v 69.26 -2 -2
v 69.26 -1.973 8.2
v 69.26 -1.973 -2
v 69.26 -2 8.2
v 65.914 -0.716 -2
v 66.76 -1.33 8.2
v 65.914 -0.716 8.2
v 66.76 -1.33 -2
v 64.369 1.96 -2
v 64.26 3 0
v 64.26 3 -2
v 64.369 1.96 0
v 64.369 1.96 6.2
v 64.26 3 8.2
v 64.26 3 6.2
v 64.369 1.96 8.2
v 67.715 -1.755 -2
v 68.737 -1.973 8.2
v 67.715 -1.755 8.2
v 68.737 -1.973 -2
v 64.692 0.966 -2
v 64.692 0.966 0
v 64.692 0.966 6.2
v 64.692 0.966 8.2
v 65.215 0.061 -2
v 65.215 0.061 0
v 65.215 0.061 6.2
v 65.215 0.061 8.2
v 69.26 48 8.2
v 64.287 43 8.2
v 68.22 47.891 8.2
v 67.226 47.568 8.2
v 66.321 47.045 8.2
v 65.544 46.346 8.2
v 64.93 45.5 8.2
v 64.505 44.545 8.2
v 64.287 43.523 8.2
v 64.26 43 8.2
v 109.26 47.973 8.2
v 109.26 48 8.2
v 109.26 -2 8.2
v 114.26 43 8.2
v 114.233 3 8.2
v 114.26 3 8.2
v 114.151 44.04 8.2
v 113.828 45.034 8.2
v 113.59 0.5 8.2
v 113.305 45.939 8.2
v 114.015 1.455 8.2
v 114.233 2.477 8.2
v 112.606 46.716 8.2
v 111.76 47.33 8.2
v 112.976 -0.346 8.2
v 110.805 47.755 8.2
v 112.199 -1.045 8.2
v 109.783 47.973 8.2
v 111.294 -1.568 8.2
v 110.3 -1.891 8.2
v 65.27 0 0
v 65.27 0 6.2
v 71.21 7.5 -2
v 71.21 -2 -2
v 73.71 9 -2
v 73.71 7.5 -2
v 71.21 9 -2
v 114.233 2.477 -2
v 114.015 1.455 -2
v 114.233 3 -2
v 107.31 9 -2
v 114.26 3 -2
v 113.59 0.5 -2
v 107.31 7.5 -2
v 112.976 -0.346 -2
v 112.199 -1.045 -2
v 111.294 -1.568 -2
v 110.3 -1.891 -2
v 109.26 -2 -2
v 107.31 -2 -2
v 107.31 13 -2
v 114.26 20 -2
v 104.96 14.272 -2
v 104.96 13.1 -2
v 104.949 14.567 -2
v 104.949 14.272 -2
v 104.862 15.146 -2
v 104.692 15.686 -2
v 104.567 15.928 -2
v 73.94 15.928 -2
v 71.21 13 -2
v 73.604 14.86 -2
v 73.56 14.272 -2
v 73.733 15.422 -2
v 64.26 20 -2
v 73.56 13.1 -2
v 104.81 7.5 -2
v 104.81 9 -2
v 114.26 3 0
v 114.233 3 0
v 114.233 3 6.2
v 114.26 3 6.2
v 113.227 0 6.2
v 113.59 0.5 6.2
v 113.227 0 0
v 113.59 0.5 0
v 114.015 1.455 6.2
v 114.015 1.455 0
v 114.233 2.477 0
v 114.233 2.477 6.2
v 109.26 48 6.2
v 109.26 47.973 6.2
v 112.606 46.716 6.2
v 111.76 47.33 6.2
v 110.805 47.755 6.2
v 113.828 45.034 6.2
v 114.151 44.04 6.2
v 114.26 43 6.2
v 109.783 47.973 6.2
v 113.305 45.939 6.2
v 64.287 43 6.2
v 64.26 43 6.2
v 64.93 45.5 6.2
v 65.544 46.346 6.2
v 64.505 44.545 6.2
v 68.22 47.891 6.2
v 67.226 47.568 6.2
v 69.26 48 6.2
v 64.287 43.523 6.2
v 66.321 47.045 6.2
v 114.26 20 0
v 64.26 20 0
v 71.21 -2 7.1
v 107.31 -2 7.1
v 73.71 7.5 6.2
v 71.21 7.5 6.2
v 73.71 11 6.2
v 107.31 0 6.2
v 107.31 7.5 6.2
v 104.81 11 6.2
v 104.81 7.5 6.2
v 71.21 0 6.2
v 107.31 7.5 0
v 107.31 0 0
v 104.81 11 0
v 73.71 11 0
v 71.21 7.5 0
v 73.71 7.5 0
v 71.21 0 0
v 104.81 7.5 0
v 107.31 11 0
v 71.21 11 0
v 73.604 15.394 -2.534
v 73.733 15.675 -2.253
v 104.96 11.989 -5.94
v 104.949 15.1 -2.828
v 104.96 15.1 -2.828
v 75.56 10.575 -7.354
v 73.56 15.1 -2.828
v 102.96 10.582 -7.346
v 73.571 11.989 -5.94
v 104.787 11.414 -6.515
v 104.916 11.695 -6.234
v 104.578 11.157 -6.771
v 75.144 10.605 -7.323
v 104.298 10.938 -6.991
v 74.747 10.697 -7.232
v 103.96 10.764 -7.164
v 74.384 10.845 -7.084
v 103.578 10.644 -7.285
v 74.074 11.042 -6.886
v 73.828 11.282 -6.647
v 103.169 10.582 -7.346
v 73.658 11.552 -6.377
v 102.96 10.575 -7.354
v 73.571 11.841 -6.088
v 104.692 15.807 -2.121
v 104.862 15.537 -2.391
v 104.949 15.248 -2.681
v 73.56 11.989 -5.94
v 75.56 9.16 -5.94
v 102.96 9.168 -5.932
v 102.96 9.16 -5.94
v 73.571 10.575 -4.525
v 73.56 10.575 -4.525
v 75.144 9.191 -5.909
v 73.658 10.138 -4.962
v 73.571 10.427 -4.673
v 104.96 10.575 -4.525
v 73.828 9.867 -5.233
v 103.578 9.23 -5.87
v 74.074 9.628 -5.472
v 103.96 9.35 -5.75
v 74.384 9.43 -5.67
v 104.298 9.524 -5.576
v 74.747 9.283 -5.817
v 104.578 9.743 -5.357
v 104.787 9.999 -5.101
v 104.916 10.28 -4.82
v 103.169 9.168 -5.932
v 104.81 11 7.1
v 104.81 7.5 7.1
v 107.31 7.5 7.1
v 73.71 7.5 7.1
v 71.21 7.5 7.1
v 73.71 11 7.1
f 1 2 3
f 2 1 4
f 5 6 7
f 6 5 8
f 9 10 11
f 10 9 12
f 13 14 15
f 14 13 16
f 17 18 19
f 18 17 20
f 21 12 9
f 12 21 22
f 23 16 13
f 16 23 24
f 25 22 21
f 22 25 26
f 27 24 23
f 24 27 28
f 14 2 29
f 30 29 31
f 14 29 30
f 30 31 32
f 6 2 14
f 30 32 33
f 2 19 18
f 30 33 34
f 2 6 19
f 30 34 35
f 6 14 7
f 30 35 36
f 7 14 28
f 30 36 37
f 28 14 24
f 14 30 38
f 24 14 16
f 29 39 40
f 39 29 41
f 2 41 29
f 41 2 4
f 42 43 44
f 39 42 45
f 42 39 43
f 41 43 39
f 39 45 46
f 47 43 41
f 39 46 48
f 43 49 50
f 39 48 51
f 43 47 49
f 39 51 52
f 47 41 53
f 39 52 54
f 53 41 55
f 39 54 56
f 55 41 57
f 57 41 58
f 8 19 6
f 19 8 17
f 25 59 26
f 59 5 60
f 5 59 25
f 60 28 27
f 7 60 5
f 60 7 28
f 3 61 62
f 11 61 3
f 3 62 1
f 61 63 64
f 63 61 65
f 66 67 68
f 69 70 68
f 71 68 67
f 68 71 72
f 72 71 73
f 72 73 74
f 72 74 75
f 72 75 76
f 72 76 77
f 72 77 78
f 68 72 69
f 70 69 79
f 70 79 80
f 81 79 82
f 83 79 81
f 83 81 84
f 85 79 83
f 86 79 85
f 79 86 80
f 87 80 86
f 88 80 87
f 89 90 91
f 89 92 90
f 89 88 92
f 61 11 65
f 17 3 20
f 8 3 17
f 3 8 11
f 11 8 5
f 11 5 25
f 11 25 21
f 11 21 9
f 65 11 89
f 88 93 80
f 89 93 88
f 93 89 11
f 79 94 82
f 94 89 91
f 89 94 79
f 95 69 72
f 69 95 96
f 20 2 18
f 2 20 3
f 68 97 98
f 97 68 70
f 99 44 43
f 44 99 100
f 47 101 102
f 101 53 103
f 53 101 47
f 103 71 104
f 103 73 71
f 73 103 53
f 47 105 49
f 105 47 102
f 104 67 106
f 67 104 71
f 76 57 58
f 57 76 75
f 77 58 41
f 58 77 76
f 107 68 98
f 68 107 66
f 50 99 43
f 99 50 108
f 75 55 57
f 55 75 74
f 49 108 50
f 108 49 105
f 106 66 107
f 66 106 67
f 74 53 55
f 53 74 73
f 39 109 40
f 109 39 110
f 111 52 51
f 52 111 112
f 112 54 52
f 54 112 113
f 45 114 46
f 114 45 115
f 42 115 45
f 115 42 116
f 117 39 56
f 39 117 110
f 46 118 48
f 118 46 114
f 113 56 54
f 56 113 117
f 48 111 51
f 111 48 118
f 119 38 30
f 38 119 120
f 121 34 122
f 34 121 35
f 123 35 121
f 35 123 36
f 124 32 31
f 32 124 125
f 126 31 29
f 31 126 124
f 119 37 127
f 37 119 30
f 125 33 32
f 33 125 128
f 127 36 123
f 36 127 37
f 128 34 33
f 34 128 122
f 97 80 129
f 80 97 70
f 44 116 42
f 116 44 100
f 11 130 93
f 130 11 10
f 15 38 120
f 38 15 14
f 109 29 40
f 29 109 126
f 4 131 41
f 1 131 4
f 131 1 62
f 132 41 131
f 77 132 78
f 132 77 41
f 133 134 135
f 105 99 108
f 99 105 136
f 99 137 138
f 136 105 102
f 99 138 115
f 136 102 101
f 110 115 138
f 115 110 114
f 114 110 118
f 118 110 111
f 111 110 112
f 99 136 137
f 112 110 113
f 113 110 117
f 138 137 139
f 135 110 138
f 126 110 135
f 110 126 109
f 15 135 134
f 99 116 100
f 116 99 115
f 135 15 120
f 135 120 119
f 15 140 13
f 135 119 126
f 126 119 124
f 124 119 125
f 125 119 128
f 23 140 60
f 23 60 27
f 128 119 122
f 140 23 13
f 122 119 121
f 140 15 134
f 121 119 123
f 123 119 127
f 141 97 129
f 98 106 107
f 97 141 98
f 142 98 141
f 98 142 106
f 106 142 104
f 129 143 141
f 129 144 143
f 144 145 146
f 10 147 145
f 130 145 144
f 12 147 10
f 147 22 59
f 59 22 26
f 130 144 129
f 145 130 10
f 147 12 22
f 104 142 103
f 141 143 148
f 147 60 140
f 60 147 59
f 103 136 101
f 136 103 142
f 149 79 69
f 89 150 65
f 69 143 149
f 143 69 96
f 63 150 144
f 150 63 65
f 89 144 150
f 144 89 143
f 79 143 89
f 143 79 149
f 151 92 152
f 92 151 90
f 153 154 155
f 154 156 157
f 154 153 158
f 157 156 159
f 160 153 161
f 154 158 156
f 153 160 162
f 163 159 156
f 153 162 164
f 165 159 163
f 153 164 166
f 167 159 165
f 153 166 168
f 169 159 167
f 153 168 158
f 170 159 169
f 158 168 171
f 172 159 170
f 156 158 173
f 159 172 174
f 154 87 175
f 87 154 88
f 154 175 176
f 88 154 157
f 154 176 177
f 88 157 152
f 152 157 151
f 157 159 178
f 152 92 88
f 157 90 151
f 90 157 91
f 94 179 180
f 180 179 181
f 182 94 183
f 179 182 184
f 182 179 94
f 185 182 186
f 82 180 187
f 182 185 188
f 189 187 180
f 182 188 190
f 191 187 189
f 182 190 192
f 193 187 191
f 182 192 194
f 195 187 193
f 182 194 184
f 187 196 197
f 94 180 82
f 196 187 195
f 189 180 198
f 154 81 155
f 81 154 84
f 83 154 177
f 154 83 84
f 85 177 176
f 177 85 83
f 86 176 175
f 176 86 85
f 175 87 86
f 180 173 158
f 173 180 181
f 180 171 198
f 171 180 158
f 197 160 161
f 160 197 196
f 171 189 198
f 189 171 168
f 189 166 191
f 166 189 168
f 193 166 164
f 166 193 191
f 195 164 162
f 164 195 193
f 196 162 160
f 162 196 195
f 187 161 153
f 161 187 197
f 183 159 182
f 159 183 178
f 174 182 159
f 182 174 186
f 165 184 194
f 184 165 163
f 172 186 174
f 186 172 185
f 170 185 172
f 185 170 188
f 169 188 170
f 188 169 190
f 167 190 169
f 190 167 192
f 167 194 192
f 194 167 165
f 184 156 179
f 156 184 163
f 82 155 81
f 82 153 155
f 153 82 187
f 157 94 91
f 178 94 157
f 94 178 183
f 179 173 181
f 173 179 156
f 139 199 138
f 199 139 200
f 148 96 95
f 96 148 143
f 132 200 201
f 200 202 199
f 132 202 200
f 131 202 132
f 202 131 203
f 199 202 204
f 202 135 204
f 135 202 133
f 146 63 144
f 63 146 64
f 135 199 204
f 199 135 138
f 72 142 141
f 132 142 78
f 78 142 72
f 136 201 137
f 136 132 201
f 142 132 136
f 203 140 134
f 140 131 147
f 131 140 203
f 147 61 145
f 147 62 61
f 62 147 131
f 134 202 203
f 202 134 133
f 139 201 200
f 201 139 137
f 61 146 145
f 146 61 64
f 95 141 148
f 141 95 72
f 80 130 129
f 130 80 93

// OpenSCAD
// file: dimensions/ipad-pro-dimensions.scad
// phone
ipad_pro__phone_width       = 178.52; //from spec
ipad_pro__phone_length      = 247.64; //from spec
ipad_pro__phone_thickness   = 5.9+phone_thickness_offset; //from spec
ipad_pro__phone_edge_radius = 8; // guess
ipad_pro__rounded_corners   = false;

// camera bump
ipad_pro__camera_bump_x_offset  = 11.82-camera_bump_offset; //from spec with offset
ipad_pro__camera_bump_y_offset  = 18.67-camera_bump_offset; //from spec with offset
ipad_pro__camera_bump_width     = 11.26+camera_bump_offset*2; //from spec with offset
ipad_pro__camera_bump_length    = 24.53+camera_bump_offset*2; //from spec with offset
ipad_pro__camera_bump_thickness = 1.56+1;  //spec 1.56
ipad_pro__camera_bump_radius    = ipad_pro__camera_bump_width/2; //Xr specific, make it round

// truedepth notch
ipad_pro__notch_height = 8.7; //ipad's bezel is 8.7. this is a definite guess

ipad_pro__cutout_1_dist = -5;
ipad_pro__cutout_2_dist = -8.5;


// clip
ipad_pro__clip_width = 50;
ipad_pro__clip_thickness = ipad_pro__phone_thickness+(clip_top_bottom_thickness*2);

// clip cutout
ipad_pro__cutout_thickness = ipad_pro__clip_thickness/2+5; //2 is just for some clearance

ipad_pro__notch_offset_height = ipad_pro__notch_height+dfm_notch_offset; //notch height from spec, add more?
ipad_pro__notch_offset_width = ipad_pro__phone_width/2-mirror_width/2;
ipad_pro__back_offset_width = ipad_pro__phone_width/2-mirror_back_width/2;
// file: dimensions/xr-dimensions.scad
// notes
// - left/right alignment is good
// - up/down alignment is good
// - need extra cutouts (to mirror slot width)
// - move camera bump down 1mm, size is good


// phone
xr__phone_width       = 75.72; //from spec
xr__phone_length      = 150.91; //from spec
xr__phone_thickness   = 8.32+phone_thickness_offset; //from spec
xr__phone_edge_radius = 8; // guess
xr__rounded_corners   = true;

// camera bump
xr__camera_bump_x_offset  = 12.28-camera_bump_offset; //from spec with offset
xr__camera_bump_y_offset  = 12.28-camera_bump_offset+1; //from spec with offset, 1 is from DFM test
xr__camera_bump_width     = 10.93+camera_bump_offset*2; //from spec with offset
xr__camera_bump_length    = 10.93+camera_bump_offset*2; //from spec with offset
xr__camera_bump_thickness = 1.56+1;  //spec 1.56
xr__camera_bump_radius    = xr__camera_bump_length /2; //Xr specific, make it round


// truedepth notch
xr__mirror_offset = 0;
xr__notch_height = 5.57+5.15+xr__mirror_offset;

xr__cutout_1_dist = -3+xr__mirror_offset;
xr__cutout_2_dist = -7+xr__mirror_offset;



// clip
xr__clip_width = xr__phone_width*0.66;
xr__clip_thickness = xr__phone_thickness+(clip_top_bottom_thickness*2);

// clip cutout
xr__cutout_thickness = xr__clip_thickness/2+5; //2 is just for some clearance

xr__notch_offset_height = xr__notch_height+dfm_notch_offset; //notch height from spec, add more?
xr__notch_offset_width = xr__phone_width/2-mirror_width/2;
xr__back_offset_width = xr__phone_width/2-mirror_back_width/2;
// file: dimensions/xs-dimensions.scad
// notes
// - increase camera bump height by 1mm (guess)
// - everything else is good




// phone
xs__phone_width       = 70.94; //from spec
xs__phone_length      = 143.57; //from spec
xs__phone_thickness   = 7.7+phone_thickness_offset; //from spec
xs__phone_edge_radius = 8; // guess
xs__rounded_corners   = true;

// camera bump
xs__camera_bump_x_offset  = 11.82-camera_bump_offset; //from spec with offset
xs__camera_bump_y_offset  = 18.67-camera_bump_offset; //from spec with offset
xs__camera_bump_width     = 11.26+camera_bump_offset*2; //from spec with offset
xs__camera_bump_length    = 24.23+camera_bump_offset*2+1; //from spec with offset, 1 is DFM experimental
xs__camera_bump_thickness = 1.56+1;  //spec 1.56
xs__camera_bump_radius    = xs__camera_bump_width /2; //Xr specific, make it round

// truedepth notch
xs__mirror_offset = 2;
xs__notch_height = 3.91+4.99+xs__mirror_offset;

xs__cutout_1_dist = -4.8+xs__mirror_offset;
xs__cutout_2_dist = -8.5+xs__mirror_offset;




// clip
xs__clip_width = xs__phone_width*0.66;
xs__clip_thickness = xs__phone_thickness+(clip_top_bottom_thickness*2);

// clip cutout
xs__cutout_thickness = xs__clip_thickness/2+5; //2 is just for some clearance

xs__notch_offset_height = xs__notch_height+dfm_notch_offset; //notch height from spec, add more?
xs__notch_offset_width = xs__phone_width/2-mirror_width/2;
xs__back_offset_width = xs__phone_width/2-mirror_back_width/2;
// file: dimensions/xs-max-dimensions.scad
// todo - move mirror assembly "down" by 2mms

// phone
xs_max__phone_width       = 77.42; //from spec
xs_max__phone_length      = 157.53; //from spec
xs_max__phone_thickness   = 7.7+phone_thickness_offset; //from spec
xs_max__phone_edge_radius = 8; // guess
xs_max__rounded_corners   = true;

// camera bump
xs_max__camera_bump_x_offset  = 11.82-camera_bump_offset; //from spec with offset
xs_max__camera_bump_y_offset  = 18.67-camera_bump_offset+1; //from spec with offset, 1 is DFM experimental
xs_max__camera_bump_width     = 11.26+camera_bump_offset*2; //from spec with offset
xs_max__camera_bump_length    = 24.53+camera_bump_offset*2; //from spec with offset
xs_max__camera_bump_thickness = 1.56+1;  //spec 1.56
xs_max__camera_bump_radius    = xs_max__camera_bump_width/2; //Xr specific, make it round

// truedepth notch
xs_max__mirror_offset = 2;
xs_max__notch_height = 3.91+4.99+xs_max__mirror_offset;

xs_max__cutout_1_dist = -4.8+xs_max__mirror_offset;
xs_max__cutout_2_dist = -8.5+xs_max__mirror_offset;


// clip
xs_max__clip_width = xs_max__phone_width*0.66;
xs_max__clip_thickness = xs_max__phone_thickness+(clip_top_bottom_thickness*2);

// clip cutout
xs_max__cutout_thickness = xs_max__clip_thickness/2+5; //2 is just for some clearance

xs_max__notch_offset_height = xs_max__notch_height+dfm_notch_offset; //notch height from spec, add more?
xs_max__notch_offset_width = xs_max__phone_width/2-mirror_width/2;
xs_max__back_offset_width = xs_max__phone_width/2-mirror_back_width/2;
// file: components/assembly.scad
module generate_assembly(phone_width, phone_length, phone_thickness, phone_edge_radius, rounded_corners, notch_offset_width, notch_offset_height, back_offset_width, camera_bump_x_offset, camera_bump_y_offset, camera_bump_width, camera_bump_length, camera_bump_thickness, camera_bump_radius, clip_width, clip_length, clip_thickness, clip_top_bottom_thickness, cutout_width, cutout_length, cutout_thickness, cutout_1_dist, cutout_2_dist) {
  //trim up front curve
  difference() {
    //trim up top length
    difference() {
      //cutout from slot
        difference() {
          difference() {
            //clip with back
            union() {
              //resulting clip
              difference() {
                //clip cube
                translate([phone_width/2-clip_width/2, -clip_top_bottom_thickness, -clip_top_bottom_thickness]) color("red") roundedcube2(clip_width, clip_length, clip_thickness, 5);
                //phone and mirror back
                union() {
                  //phone
                  phone(phone_width, phone_length, phone_thickness, phone_edge_radius, rounded_corners, camera_bump_x_offset, camera_bump_y_offset, camera_bump_width, camera_bump_length, camera_bump_thickness, camera_bump_radius);

                  //mirror slot
                  translate([notch_offset_width, notch_offset_height, 0]) {
                    mirror();
                  }
                }
              }

              //mirror back 4.1 is a magic number :/
              translate([back_offset_width, notch_offset_height+4.1, 0]) {
                color("blue") mirror_round();
              }
          }

          small_cutout_width = cutout_width-5;
          // cutout to mirror - with some magic numbers
          translate([phone_width/2-small_cutout_width/2, cutout_1_dist, -clip_top_bottom_thickness-1]) color("green") cube([small_cutout_width, cutout_length, cutout_thickness]);
        }
        // cutout2 - trim up interior edges
        translate([phone_width/2-cutout_width/2, cutout_2_dist, -clip_top_bottom_thickness-1]) color("green") cube([cutout_width, cutout_length, cutout_thickness]);
      }
      // front trim cube
      translate([-10, 20, -phone_thickness]) cube([phone_width+20, phone_length+20, 10]);
    }

    if (rounded_corners == true) {
      difference() {
          difference() {
              translate ([0,4.2,(clip_thickness/2)-clip_top_bottom_thickness]) rotate(90, [0,1,0]) cylinder(phone_width,  clip_thickness/2+20, clip_thickness/2+20);
              translate ([-1,4.3,(clip_thickness/2)-clip_top_bottom_thickness]) rotate(90, [0,1,
              0]) cylinder(phone_width+5,  clip_thickness/2, clip_thickness/2);
          }
          translate ([-1,4.3,-50]) cube([phone_width+7,100,100]);
      }
    }

  }

}
// file: components/mirror.scad
// mirror
mirror_height = 25.4; //from spec
mirror_width = 35.4 + dfm_mirror_width; //from spec -- 36.1 in file?
mirror_thickness = 3 + dfm_mirror_thickness; //from spec

// mirror back
mirror_back_height = 8.4;
mirror_back_width = 35.4-4;
mirror_back_thickness = 2;

module mirror() {
    rotate(a=225, v=[1,0,0]){
        cube([mirror_width, mirror_height, mirror_thickness]);
    }
}

module mirror_round(l,w,h, angle = 225, radius = 2) {
    rotate(a=225, v=[1,0,0]){
        roundedcube2(mirror_back_width, mirror_back_height, mirror_back_thickness,radius);
    }
}
// file: components/phone.scad
module phone(phone_width, phone_length, phone_thickness, phone_edge_radius, rounded_corners, camera_bump_x_offset, camera_bump_y_offset, camera_bump_width, camera_bump_length, camera_bump_thickness, camera_bump_radius) {
    sphere_size = (phone_thickness/2);

    //minowski adds spheres around parts, so we need to translate by sphere_size
    if (rounded_corners == true) {
        translate([sphere_size, sphere_size, sphere_size]) {
          minkowski() {
             //minowski adds spheres around parts, so we need remove sphere size from width, length, and thickness
             roundedcube2(phone_width-sphere_size*2, phone_length-sphere_size*2, 0.00001, phone_edge_radius);
             sphere(r=sphere_size,$fn=50);
           }
        }
    } else {
      roundedcube2(phone_width-sphere_size*2, phone_length-sphere_size*2, phone_thickness, phone_edge_radius);
    }

    //translate([phone_width-camera_bump_x_offset-camera_bump_width/2, camera_bump_y_offset-camera_bump_y_offset/2, phone_thickness-0.1]) {
    translate([phone_width-camera_bump_width/2-camera_bump_x_offset, camera_bump_y_offset-camera_bump_length/2, phone_thickness-0.1]) {
        roundedcube2(camera_bump_width, camera_bump_length, camera_bump_thickness+0.1, camera_bump_radius);
    }
}
// file: components/rounded-cube.scad
module roundedsquare(xx, yy, radius) {
    difference(){

        square([xx,yy]);

        difference(){
            translate([-.5,-.5,-.2])
            square([radius+.5,radius+.5]);

            translate([radius,radius,height/2])
            cylinder(height,radius,radius,true);
        }
        translate([xx,0,0])
        rotate(90)
        difference(){
            translate([-.5,-.5,-.2])
            square([radius+.5,radius+.5]);

            translate([radius,radius,height/2])
            cylinder(height,radius,radius,true);
        }

        translate([xx,yy,0])
        rotate(180)
        difference(){
            translate([-.5,-.5,-.2])
            square([radius+.5,radius+.5]);

            translate([radius,radius,height/2])
            cylinder(height,radius,radius,true);
        }

        translate([0,yy,0])
        rotate(270)
        difference(){
            translate([-.5,-.5,-.2])
            square([radius+.5,radius+.5]);

            translate([radius,radius,height/2])
            cylinder(height,radius,radius,true);
        }
    }
}

module roundedcube2(xx, yy, height, radius) {
    difference(){

        cube([xx,yy,height]);

        difference(){
            translate([-.5,-.5,-.2])
            cube([radius+.5,radius+.5,height+.5]);

            translate([radius,radius,height/2])
            cylinder(height,radius,radius,true);
        }
        translate([xx,0,0])
        rotate(90)
        difference(){
            translate([-.5,-.5,-.2])
            cube([radius+.5,radius+.5,height+.5]);

            translate([radius,radius,height/2])
            cylinder(height,radius,radius,true);
        }

        translate([xx,yy,0])
        rotate(180)
        difference(){
            translate([-.5,-.5,-.2])
            cube([radius+.5,radius+.5,height+.5]);

            translate([radius,radius,height/2])
            cylinder(height,radius,radius,true);
        }

        translate([0,yy,0])
        rotate(270)
        difference(){
            translate([-.5,-.5,-.2])
            cube([radius+.5,radius+.5,height+.5]);

            translate([radius,radius,height/2])
            cylinder(height,radius,radius,true);
        }
    }
}
// file: components/constants.scad
// global offsets
phone_thickness_offset = 0.3;
camera_bump_offset = 0.1;

// DFM experimental offsets
dfm_mirror_width= 0.7;
dfm_mirror_thickness=0.15;
dfm_notch_offset=2.3;

//mirror
mirror_width = 35.4 + dfm_mirror_width; //from spec -- 36.1 in file?

// clip
clip_length = 50;
clip_top_bottom_thickness = 2;

// clip cutout
cutout_width = mirror_width;
cutout_length = 16;
// main file
// DONT TOUCH THIS
$fs = 0.1;
include <components/constants.scad>;
include <components/rounded-cube.scad>;
include <components/phone.scad>;
include <components/mirror.scad>;
include <components/assembly.scad>;

include <dimensions/xs-max-dimensions.scad>;
include <dimensions/xs-dimensions.scad>;
include <dimensions/xr-dimensions.scad>;
include <dimensions/ipad-pro-dimensions.scad>;

//translate([0,0,0]) generate_assembly(xs_max__phone_width, xs_max__phone_length, xs_max__phone_thickness, xs_max__phone_edge_radius, xs_max__rounded_corners, xs_max__notch_offset_width, xs_max__notch_offset_height, xs_max__back_offset_width, xs_max__camera_bump_x_offset, xs_max__camera_bump_y_offset, xs_max__camera_bump_width, xs_max__camera_bump_length, xs_max__camera_bump_thickness, xs_max__camera_bump_radius, xs_max__clip_width, clip_length, xs_max__clip_thickness, clip_top_bottom_thickness, cutout_width, cutout_length, xs_max__cutout_thickness, xs_max__cutout_1_dist, xs_max__cutout_2_dist);

//translate([0,0,0]) generate_assembly(xr__phone_width, xr__phone_length, xr__phone_thickness, xr__phone_edge_radius, xr__rounded_corners, xr__notch_offset_width, xr__notch_offset_height, xr__back_offset_width, xr__camera_bump_x_offset, xr__camera_bump_y_offset, xr__camera_bump_width, xr__camera_bump_length, xr__camera_bump_thickness, xr__camera_bump_radius, xr__clip_width, clip_length, xr__clip_thickness, clip_top_bottom_thickness, cutout_width, cutout_length, xr__cutout_thickness, xr__cutout_1_dist, xr__cutout_2_dist);

//translate([0,0,0]) generate_assembly(xs__phone_width, xs__phone_length, xs__phone_thickness, xs__phone_edge_radius,xs__rounded_corners, xs__notch_offset_width, xs__notch_offset_height, xs__back_offset_width, xs__camera_bump_x_offset, xs__camera_bump_y_offset, xs__camera_bump_width, xs__camera_bump_length, xs__camera_bump_thickness, xs__camera_bump_radius, xs__clip_width, clip_length, xs__clip_thickness, clip_top_bottom_thickness, cutout_width, cutout_length, xs__cutout_thickness, xs__cutout_1_dist, xs__cutout_2_dist);

translate([0,0,0]) generate_assembly(ipad_pro__phone_width, ipad_pro__phone_length, ipad_pro__phone_thickness, ipad_pro__phone_edge_radius, ipad_pro__rounded_corners,ipad_pro__notch_offset_width, ipad_pro__notch_offset_height, ipad_pro__back_offset_width, ipad_pro__camera_bump_x_offset, ipad_pro__camera_bump_y_offset, ipad_pro__camera_bump_width, ipad_pro__camera_bump_length, ipad_pro__camera_bump_thickness, ipad_pro__camera_bump_radius, ipad_pro__clip_width, clip_length, ipad_pro__clip_thickness, clip_top_bottom_thickness, cutout_width, cutout_length, ipad_pro__cutout_thickness, ipad_pro__cutout_1_dist, ipad_pro__cutout_2_dist);
